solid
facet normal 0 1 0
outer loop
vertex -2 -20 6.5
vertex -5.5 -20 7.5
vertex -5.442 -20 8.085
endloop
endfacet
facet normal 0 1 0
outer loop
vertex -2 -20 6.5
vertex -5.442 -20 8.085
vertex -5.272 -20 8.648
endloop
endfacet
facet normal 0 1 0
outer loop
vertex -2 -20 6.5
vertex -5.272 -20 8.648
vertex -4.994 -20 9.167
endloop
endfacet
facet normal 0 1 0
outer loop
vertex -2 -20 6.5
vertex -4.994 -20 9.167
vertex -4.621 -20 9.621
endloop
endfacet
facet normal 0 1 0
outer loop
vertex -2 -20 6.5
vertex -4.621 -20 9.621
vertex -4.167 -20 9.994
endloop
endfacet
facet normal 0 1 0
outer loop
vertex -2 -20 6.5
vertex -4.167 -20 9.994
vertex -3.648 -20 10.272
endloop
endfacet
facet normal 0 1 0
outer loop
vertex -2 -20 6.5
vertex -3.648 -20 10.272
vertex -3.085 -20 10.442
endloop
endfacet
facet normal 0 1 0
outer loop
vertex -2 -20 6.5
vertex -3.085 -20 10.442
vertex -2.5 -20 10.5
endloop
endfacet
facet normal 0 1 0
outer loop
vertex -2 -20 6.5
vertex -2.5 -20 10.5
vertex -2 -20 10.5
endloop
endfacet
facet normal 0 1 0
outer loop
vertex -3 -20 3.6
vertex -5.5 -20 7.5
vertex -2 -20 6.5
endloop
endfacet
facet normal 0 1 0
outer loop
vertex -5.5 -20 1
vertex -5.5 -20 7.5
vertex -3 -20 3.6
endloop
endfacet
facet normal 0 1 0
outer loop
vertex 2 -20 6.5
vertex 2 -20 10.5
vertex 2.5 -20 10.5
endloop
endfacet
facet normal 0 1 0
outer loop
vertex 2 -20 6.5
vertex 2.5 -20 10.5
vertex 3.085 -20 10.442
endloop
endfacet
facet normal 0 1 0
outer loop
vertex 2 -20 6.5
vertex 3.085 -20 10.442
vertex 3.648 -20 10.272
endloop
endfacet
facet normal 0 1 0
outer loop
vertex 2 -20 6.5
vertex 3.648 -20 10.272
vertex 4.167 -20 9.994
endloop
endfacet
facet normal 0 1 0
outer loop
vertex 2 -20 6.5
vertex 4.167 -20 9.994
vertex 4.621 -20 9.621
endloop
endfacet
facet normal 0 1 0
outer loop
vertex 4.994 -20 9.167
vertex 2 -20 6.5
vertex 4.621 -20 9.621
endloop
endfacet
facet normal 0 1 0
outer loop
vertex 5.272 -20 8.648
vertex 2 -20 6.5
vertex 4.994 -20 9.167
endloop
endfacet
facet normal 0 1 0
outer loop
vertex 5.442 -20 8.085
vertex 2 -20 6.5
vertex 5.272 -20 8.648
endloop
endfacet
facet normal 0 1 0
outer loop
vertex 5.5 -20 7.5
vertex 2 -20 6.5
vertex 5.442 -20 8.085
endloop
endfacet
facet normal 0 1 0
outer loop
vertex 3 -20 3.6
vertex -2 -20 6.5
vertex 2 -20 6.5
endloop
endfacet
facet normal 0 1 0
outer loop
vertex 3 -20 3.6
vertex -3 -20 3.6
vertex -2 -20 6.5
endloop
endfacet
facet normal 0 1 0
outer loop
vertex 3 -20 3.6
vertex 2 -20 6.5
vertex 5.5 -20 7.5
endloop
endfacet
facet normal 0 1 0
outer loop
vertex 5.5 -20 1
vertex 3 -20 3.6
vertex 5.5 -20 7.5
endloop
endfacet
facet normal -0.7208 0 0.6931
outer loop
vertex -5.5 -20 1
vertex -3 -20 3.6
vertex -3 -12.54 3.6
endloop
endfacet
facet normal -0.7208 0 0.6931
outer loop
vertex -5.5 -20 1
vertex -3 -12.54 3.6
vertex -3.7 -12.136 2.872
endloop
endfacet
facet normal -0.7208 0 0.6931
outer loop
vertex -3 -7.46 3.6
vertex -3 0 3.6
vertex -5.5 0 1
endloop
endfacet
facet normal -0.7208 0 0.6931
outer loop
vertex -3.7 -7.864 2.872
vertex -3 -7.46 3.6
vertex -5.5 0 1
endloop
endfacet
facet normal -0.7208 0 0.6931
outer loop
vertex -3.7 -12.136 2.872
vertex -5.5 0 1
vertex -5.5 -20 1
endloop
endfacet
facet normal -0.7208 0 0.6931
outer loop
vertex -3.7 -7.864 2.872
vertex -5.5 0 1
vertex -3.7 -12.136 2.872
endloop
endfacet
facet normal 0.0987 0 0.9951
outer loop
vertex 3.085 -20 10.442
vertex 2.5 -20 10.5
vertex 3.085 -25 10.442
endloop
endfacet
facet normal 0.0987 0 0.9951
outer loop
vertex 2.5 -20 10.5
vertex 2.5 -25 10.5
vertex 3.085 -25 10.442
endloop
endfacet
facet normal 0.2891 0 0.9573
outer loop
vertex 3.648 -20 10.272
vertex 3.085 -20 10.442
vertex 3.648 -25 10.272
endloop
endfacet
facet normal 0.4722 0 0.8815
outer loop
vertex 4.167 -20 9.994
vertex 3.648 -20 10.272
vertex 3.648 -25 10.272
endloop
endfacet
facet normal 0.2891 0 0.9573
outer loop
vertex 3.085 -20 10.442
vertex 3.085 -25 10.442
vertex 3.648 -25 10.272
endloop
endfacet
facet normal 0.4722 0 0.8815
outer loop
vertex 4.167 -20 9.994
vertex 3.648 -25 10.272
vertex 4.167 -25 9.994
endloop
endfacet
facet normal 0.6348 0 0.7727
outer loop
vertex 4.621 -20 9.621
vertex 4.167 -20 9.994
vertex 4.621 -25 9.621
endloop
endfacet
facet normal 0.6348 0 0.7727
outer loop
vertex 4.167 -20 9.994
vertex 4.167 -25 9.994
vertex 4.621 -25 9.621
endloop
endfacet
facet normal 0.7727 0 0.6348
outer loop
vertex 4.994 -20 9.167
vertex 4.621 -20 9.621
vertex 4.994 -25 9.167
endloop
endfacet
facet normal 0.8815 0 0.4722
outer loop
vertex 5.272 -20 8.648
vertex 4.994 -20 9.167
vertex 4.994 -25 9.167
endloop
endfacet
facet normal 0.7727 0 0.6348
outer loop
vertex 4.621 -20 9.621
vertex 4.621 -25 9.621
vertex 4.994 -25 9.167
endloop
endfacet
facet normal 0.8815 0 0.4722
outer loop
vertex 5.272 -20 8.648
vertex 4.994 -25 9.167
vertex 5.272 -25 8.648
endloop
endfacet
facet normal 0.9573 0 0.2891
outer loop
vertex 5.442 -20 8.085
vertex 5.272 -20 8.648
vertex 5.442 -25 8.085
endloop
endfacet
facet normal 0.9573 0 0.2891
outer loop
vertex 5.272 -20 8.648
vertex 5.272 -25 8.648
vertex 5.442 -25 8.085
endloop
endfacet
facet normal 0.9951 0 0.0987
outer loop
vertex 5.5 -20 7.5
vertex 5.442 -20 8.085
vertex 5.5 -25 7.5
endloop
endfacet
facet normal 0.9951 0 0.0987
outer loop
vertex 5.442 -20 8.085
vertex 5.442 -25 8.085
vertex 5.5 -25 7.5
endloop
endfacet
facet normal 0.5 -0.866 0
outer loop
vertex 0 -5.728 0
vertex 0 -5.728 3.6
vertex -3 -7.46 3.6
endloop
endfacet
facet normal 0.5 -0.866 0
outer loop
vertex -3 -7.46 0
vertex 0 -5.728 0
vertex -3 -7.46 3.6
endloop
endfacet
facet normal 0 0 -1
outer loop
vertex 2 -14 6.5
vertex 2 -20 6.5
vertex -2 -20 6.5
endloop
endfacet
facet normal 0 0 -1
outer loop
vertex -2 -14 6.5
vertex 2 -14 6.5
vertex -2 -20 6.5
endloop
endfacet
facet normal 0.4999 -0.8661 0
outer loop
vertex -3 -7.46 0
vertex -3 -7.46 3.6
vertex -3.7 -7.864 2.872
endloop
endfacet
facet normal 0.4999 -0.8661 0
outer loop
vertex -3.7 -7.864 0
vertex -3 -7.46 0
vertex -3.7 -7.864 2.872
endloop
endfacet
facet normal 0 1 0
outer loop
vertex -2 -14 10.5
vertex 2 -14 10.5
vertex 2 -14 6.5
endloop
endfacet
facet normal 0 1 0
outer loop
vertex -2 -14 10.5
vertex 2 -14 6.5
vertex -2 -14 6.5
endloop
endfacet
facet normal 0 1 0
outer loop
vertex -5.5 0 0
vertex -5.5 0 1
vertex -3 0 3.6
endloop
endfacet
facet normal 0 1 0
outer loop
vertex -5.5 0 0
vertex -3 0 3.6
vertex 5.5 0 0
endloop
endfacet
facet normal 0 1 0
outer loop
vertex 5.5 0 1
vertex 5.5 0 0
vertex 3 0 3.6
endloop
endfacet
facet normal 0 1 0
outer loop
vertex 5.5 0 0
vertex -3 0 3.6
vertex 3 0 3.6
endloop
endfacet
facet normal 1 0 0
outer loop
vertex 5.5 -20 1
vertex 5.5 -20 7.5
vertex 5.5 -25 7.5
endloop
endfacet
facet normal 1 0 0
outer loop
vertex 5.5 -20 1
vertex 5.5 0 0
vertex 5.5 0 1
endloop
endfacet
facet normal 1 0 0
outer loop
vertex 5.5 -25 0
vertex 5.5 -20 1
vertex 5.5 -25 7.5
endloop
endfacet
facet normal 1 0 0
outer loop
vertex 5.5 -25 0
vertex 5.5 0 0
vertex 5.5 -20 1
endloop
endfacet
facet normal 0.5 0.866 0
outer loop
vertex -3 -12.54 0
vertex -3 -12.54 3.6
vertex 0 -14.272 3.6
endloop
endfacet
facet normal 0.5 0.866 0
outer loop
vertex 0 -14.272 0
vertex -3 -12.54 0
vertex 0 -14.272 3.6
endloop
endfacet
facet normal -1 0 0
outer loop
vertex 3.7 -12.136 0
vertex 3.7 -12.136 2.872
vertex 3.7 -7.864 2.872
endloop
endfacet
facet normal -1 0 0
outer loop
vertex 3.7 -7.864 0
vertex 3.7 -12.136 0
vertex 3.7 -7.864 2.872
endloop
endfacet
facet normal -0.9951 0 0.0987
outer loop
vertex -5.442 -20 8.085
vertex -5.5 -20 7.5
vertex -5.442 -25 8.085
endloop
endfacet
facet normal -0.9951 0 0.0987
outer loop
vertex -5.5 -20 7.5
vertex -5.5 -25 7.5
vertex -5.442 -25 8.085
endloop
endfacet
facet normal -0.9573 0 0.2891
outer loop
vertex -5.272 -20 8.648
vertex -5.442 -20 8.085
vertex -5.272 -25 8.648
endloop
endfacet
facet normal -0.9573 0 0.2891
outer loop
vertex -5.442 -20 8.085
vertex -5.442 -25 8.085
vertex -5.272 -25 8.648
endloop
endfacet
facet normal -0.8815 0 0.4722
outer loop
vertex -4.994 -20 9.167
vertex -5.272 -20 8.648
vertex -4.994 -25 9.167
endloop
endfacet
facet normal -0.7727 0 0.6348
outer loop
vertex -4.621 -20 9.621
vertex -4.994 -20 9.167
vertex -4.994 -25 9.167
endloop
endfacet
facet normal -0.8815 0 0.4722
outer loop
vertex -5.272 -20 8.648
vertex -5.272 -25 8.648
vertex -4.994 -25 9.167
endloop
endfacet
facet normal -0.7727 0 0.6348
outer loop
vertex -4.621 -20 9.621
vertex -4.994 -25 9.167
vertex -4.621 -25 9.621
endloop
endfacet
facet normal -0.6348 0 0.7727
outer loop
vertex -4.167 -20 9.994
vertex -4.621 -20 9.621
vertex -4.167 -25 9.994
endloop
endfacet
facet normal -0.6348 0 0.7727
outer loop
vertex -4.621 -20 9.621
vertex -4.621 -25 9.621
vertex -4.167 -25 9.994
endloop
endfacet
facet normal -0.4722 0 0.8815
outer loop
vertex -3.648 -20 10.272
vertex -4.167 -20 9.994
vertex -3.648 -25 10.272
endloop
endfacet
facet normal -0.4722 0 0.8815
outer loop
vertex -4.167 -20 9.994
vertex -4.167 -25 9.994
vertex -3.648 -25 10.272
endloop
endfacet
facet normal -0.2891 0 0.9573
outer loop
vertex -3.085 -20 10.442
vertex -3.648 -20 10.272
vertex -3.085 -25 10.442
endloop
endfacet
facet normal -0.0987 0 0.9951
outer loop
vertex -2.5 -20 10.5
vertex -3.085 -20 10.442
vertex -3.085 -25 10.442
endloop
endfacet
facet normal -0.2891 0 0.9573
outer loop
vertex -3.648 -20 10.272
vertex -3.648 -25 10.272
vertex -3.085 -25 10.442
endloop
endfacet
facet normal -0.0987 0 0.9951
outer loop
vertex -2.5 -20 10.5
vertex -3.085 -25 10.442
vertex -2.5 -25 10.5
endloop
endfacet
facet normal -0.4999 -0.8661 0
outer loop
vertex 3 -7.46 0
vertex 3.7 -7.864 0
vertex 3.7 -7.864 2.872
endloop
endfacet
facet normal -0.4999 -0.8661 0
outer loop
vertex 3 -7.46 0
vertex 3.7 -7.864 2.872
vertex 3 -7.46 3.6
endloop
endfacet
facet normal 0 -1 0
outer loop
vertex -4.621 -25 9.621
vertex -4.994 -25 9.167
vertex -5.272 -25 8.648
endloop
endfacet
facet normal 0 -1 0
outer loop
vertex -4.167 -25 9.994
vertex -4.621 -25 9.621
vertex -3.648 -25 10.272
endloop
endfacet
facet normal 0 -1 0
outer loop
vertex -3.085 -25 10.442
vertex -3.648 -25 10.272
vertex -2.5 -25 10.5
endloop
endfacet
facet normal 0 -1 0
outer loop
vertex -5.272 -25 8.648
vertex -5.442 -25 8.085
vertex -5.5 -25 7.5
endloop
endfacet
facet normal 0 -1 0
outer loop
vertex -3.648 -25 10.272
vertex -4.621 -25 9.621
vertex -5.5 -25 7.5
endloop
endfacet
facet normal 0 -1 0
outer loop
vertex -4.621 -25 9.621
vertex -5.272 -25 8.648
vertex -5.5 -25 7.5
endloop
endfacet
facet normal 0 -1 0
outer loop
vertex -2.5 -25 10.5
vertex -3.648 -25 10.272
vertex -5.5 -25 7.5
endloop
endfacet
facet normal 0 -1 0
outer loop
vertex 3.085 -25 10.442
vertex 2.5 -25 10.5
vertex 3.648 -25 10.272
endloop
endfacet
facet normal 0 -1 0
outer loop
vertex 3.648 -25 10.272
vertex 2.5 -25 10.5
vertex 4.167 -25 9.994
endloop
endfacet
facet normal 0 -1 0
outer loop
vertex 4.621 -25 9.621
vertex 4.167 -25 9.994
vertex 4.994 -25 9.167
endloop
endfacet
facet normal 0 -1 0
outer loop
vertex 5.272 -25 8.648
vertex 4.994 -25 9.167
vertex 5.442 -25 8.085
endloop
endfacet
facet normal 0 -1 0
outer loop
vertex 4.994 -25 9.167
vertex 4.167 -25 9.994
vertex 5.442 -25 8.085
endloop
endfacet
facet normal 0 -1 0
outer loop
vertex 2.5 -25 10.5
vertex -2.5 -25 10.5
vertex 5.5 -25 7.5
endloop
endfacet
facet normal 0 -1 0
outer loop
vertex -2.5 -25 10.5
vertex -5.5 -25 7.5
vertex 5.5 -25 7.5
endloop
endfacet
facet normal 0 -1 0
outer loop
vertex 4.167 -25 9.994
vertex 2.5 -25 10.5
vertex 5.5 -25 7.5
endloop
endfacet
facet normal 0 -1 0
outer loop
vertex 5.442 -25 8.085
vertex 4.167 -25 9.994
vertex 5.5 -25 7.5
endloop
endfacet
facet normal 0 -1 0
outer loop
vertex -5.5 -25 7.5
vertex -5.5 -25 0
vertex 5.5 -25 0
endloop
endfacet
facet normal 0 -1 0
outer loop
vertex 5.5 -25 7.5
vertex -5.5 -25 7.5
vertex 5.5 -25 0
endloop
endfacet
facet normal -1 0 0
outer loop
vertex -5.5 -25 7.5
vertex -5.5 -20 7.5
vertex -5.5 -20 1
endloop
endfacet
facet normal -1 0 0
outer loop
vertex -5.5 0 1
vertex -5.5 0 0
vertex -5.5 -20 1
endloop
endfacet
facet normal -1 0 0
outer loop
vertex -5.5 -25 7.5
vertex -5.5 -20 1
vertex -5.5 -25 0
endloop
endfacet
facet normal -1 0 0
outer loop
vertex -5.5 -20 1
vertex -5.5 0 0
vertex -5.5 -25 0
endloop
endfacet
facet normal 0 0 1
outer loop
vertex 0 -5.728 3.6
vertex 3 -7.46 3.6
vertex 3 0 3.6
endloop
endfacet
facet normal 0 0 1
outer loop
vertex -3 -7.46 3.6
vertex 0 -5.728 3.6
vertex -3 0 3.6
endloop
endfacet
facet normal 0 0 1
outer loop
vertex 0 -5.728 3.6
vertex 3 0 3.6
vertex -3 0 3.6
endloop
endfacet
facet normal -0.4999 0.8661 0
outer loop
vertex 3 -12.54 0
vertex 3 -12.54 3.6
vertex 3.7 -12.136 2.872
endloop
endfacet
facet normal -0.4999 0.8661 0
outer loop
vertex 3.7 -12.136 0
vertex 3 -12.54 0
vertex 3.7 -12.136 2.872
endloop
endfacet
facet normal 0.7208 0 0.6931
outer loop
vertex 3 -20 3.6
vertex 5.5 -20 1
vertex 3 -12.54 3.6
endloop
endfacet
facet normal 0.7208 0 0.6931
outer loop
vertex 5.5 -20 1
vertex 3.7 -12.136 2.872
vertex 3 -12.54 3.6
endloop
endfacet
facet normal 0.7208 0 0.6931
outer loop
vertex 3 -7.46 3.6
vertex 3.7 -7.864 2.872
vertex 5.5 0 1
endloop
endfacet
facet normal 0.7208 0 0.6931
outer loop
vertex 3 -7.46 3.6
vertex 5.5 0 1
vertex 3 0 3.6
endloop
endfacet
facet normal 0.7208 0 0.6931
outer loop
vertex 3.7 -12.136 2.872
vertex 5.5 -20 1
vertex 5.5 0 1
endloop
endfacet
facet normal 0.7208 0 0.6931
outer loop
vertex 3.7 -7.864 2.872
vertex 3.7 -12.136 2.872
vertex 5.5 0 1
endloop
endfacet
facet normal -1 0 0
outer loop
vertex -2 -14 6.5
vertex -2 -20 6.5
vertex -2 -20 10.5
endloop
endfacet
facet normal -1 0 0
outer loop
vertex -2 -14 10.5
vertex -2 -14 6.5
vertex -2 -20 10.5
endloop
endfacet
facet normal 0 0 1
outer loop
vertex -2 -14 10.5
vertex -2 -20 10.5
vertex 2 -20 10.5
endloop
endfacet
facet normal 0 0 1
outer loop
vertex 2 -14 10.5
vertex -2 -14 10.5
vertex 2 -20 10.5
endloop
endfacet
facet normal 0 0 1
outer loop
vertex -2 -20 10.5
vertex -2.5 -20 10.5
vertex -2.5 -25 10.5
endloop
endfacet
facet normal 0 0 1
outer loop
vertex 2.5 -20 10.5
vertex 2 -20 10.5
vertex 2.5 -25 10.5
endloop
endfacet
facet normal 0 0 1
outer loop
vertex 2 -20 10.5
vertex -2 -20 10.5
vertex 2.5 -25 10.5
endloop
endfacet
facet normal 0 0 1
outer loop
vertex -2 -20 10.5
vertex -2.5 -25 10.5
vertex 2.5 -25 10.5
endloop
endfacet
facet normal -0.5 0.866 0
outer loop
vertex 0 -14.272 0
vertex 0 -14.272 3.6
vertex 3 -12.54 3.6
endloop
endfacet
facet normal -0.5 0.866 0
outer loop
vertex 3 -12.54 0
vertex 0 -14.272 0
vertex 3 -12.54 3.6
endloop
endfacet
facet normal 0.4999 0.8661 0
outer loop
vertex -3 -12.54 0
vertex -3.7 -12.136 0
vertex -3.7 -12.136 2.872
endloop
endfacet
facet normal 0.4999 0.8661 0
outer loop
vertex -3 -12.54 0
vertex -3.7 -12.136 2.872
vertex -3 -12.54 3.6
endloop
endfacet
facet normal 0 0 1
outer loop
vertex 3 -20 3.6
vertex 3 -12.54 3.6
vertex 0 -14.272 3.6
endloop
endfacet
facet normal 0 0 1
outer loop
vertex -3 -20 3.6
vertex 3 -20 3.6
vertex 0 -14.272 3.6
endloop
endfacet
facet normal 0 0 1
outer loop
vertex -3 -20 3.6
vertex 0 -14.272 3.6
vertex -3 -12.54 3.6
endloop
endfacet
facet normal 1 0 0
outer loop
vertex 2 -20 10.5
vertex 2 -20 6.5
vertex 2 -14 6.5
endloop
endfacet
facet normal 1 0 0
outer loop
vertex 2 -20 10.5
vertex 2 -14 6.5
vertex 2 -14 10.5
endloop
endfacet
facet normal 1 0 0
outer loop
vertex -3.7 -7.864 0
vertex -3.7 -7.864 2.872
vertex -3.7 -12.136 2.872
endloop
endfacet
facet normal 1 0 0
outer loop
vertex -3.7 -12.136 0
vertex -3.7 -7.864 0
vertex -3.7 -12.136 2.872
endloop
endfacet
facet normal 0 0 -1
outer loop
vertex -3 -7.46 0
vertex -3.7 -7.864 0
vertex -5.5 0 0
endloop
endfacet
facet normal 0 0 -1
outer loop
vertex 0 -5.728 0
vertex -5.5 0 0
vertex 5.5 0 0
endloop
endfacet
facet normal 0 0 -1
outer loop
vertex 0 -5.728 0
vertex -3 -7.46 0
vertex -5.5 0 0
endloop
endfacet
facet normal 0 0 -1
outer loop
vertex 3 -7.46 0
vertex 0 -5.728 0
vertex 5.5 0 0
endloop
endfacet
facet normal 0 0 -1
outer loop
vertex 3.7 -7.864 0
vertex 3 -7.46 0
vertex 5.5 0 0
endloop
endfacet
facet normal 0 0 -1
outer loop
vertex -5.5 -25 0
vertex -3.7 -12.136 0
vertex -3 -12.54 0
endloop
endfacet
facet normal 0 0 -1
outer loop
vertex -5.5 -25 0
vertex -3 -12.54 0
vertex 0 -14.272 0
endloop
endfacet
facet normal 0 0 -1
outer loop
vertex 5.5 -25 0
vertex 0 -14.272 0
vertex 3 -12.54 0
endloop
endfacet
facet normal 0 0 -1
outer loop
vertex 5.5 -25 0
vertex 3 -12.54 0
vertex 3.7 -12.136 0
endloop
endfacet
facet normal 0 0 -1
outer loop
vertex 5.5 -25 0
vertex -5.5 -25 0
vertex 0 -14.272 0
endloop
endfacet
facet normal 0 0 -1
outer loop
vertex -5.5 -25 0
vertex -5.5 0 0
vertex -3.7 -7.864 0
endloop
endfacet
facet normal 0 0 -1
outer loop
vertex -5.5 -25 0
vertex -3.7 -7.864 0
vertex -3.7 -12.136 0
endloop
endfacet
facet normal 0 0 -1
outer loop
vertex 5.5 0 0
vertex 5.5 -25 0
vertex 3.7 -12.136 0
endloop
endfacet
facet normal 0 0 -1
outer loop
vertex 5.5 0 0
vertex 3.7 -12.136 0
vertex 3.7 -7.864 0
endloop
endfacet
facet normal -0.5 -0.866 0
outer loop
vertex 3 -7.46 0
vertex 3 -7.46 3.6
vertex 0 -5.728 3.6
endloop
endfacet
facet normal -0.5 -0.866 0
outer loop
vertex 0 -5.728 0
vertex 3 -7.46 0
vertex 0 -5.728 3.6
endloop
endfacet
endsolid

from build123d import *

# Parameters (mm, degrees)
F1_DEPTH = 20
F3_DEPTH = 3.6
F4_W     = 11
F4_H     = 5
F5_DEPTH = 10.5
F6_W     = 4
F6_H     = 4
F7_DEPTH = 6
F8_R     = 3


with BuildPart() as f1:
    # F0 (on Front) → F1 (new body)
    with BuildSketch(Plane.XZ):
        Polygon((-5.5, 0), (5.5, 0), (5.5, 1), (3, 3.6), (0, 3.6), (-3, 3.6), (-5.5, 1), align=None)
    extrude(amount=F1_DEPTH)

    # F2 (on face) → F3 (cut, through all)
    with BuildSketch(Plane.XY.offset(3.6)):
        Polygon((3, -7.459659), (0, -5.727608), (-3, -7.459659), (-3, -12.540341), (0, -14.272392), (3, -12.540341), align=None)
        Polygon((3.7, -7.863804), (3, -7.459659), (3, -12.540341), (3.7, -12.136196), align=None)
        Polygon((-3, -12.540341), (-3, -7.459659), (-3.7, -7.863804), (-3.7, -12.136196), align=None)
    extrude(amount=-F3_DEPTH, mode=Mode.SUBTRACT)

    # F4 (on face) → F5 (join)
    with BuildSketch(Plane(origin=(0, 0, 0), x_dir=(1, 0, 0), z_dir=(0, 0, -1))):
        with Locations((0, 22.5)):
            Rectangle(F4_W, F4_H)
    extrude(amount=-F5_DEPTH)

    # F6 (on face) → F7 (join)
    with BuildSketch(Plane(origin=(0, -20, 0), x_dir=(-1, 0, 0), z_dir=(0, 1, 0))):
        with Locations((0, 8.5)):
            Rectangle(F6_W, F6_H)
    extrude(amount=F7_DEPTH)

    # F8
    f8_edges = [f1.edges().sort_by_distance(p)[0] for p in [
        (-5.5, -22.5, 10.5),
        (5.5, -22.5, 10.5),
    ]]
    fillet(f8_edges, radius=F8_R)


solid = f1.part
